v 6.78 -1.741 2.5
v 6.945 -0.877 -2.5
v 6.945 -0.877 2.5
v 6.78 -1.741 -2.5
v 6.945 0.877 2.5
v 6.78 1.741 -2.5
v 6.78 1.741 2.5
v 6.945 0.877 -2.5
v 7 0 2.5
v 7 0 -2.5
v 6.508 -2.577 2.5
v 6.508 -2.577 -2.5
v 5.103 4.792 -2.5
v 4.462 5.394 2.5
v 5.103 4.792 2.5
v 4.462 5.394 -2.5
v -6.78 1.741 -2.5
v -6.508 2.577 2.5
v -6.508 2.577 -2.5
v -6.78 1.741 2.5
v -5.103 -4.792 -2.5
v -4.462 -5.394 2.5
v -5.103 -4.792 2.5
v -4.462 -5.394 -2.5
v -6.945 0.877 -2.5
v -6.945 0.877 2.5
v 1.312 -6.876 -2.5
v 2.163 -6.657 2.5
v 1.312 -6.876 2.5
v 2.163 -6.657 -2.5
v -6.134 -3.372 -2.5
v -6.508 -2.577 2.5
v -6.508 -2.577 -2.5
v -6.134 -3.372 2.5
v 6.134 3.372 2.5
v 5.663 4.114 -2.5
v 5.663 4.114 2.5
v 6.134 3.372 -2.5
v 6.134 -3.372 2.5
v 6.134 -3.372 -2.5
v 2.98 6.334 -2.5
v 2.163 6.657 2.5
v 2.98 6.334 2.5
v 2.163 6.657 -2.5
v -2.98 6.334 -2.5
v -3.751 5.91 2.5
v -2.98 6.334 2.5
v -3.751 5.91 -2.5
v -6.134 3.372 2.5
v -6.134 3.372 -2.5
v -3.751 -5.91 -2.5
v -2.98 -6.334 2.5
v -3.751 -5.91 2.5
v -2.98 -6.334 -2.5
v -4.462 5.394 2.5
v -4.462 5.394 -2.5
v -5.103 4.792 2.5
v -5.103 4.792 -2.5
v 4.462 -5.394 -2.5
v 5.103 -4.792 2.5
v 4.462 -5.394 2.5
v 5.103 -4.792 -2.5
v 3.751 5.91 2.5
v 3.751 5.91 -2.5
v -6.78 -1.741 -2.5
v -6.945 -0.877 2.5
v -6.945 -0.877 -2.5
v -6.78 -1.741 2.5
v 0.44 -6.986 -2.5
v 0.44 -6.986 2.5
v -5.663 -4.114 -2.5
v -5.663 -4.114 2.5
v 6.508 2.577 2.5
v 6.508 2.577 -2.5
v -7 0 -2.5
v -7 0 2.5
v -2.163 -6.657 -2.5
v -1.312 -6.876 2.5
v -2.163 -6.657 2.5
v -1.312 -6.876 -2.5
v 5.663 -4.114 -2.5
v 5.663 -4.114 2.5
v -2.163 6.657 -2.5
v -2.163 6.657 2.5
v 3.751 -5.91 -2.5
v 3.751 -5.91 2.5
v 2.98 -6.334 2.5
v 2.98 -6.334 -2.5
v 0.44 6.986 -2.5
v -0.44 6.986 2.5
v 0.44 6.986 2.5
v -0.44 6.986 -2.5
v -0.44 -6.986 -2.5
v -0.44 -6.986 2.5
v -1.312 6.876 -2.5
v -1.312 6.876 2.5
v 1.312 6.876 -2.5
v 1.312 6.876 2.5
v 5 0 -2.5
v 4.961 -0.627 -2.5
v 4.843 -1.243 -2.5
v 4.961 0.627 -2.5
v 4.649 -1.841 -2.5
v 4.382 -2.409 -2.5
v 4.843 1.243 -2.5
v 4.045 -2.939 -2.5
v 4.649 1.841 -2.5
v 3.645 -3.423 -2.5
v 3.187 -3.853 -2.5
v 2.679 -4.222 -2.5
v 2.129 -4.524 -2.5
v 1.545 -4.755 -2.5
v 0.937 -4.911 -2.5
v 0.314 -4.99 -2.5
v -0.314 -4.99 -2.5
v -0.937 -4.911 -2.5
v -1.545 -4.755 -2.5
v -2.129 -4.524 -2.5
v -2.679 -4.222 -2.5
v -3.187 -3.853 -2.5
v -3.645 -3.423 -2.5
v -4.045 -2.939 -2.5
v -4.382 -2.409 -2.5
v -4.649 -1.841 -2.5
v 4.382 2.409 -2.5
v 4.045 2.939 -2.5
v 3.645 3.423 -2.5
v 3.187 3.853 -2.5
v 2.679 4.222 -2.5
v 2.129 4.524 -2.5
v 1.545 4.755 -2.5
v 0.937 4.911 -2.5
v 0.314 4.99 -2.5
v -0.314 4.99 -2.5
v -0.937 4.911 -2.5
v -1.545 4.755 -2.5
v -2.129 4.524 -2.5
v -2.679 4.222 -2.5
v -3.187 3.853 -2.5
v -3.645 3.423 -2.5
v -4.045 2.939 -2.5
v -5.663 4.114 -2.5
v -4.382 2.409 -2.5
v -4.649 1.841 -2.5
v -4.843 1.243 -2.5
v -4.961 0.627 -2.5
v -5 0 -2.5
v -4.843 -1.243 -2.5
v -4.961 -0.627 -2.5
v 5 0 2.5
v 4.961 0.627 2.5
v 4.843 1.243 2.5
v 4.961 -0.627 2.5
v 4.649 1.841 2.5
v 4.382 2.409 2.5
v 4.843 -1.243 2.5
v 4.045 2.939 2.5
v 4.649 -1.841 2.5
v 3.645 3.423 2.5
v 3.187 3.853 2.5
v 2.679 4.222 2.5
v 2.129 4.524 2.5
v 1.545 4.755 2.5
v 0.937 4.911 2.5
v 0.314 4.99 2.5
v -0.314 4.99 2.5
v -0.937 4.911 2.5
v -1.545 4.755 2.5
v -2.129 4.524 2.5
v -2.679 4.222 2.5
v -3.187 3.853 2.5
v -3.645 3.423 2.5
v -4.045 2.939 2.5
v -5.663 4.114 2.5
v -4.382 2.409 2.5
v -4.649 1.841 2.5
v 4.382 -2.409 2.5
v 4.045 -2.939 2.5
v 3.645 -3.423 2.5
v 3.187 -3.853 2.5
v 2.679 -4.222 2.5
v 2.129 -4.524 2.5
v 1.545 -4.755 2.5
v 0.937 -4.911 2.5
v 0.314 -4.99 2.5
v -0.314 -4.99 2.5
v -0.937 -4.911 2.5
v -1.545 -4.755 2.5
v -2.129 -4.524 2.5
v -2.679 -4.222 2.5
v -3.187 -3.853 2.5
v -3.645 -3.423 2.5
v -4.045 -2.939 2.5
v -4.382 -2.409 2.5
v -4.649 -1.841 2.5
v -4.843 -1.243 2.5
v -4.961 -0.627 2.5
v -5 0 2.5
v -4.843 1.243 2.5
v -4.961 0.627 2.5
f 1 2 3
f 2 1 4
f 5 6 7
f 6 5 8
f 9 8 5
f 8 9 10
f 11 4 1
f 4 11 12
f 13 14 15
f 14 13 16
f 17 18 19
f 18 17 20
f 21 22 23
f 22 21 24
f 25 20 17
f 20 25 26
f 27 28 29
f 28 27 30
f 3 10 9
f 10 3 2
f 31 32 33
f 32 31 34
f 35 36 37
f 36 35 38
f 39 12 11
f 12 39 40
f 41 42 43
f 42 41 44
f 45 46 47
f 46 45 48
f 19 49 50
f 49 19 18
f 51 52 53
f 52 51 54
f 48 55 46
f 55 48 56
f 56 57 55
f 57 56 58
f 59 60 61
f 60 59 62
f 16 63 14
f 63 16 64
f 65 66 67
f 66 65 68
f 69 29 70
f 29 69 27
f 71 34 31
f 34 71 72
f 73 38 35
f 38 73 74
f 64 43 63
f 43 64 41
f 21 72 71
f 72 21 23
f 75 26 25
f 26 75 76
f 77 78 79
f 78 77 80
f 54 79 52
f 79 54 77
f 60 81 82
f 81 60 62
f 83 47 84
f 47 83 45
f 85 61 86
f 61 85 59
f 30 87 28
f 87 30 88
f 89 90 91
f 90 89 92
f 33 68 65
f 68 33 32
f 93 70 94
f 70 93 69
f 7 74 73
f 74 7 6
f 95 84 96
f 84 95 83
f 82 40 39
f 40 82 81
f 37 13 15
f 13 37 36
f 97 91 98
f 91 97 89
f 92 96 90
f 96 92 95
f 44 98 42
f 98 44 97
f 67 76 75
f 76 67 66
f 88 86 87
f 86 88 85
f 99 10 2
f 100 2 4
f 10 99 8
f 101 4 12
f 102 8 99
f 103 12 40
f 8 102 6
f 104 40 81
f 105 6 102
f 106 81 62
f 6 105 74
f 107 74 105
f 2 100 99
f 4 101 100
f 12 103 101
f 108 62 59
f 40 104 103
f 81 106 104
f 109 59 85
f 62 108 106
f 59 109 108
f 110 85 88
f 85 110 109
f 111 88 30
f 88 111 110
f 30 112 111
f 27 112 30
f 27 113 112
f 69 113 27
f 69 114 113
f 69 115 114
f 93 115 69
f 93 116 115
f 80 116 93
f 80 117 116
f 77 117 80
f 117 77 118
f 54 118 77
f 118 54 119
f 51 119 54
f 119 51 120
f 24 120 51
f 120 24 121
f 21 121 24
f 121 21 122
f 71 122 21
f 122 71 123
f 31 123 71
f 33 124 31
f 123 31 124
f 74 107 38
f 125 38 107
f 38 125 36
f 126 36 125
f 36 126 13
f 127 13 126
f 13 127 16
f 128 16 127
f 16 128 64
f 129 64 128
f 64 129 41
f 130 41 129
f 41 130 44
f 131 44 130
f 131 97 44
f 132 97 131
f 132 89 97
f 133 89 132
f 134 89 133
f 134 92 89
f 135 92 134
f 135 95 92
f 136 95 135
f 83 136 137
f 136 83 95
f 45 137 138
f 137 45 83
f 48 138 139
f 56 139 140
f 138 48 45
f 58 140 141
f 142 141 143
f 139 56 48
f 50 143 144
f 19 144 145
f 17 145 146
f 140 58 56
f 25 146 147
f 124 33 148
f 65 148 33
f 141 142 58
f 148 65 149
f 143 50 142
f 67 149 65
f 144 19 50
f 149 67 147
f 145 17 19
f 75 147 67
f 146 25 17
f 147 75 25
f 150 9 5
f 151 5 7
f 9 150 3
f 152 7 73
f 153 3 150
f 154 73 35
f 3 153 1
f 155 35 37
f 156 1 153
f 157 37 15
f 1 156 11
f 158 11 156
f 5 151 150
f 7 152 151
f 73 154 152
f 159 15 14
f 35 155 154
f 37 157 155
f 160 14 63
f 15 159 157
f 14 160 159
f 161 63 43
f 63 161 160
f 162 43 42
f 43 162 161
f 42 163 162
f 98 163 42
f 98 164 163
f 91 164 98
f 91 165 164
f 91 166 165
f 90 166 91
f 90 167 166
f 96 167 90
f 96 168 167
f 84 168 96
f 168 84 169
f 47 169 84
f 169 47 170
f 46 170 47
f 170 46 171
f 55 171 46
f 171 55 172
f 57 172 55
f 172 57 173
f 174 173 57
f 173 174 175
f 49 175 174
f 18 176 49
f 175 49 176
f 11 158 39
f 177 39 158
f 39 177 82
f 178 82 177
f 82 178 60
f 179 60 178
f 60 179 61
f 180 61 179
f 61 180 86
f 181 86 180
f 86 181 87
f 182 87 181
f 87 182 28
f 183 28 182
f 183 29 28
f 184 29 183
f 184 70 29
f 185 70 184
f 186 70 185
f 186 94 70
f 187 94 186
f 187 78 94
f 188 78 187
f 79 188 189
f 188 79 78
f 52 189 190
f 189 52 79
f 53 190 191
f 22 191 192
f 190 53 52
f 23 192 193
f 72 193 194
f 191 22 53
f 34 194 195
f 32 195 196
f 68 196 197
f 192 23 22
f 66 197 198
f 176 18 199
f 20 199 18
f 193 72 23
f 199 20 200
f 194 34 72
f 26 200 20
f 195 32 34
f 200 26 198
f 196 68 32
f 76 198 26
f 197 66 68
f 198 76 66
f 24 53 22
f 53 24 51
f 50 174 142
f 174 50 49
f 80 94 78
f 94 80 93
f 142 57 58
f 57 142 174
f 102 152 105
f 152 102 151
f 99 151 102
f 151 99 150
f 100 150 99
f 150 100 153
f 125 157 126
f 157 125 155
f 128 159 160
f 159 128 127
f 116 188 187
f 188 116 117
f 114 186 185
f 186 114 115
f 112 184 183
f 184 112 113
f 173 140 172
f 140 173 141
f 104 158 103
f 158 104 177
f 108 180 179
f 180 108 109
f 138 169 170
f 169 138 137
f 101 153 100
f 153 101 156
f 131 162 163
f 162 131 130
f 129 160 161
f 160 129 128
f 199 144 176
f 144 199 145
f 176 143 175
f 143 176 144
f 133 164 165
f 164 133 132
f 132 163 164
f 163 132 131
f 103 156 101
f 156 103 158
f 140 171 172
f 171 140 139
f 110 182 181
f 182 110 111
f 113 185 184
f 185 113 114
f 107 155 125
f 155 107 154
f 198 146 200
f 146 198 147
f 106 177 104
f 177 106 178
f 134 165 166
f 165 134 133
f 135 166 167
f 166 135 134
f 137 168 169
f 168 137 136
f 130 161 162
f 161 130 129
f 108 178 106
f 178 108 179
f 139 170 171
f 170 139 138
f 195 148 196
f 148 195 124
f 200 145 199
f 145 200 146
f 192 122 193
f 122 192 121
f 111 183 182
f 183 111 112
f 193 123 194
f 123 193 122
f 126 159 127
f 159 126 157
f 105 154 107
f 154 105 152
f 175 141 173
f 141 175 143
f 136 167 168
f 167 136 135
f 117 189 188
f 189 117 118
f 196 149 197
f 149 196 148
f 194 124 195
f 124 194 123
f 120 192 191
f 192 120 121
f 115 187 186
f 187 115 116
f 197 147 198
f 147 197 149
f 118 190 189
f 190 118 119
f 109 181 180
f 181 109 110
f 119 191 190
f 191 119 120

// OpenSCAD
$fn = 50;


difference() {
	union() {
		translate(v = [0, 0, -2.5000000000]) {
			cylinder(h = 5, r = 7.0000000000);
		}
	}
	union() {
		translate(v = [0, 0, -100.0000000000]) {
			cylinder(h = 200, r = 5.0000000000);
		}
	}
}
